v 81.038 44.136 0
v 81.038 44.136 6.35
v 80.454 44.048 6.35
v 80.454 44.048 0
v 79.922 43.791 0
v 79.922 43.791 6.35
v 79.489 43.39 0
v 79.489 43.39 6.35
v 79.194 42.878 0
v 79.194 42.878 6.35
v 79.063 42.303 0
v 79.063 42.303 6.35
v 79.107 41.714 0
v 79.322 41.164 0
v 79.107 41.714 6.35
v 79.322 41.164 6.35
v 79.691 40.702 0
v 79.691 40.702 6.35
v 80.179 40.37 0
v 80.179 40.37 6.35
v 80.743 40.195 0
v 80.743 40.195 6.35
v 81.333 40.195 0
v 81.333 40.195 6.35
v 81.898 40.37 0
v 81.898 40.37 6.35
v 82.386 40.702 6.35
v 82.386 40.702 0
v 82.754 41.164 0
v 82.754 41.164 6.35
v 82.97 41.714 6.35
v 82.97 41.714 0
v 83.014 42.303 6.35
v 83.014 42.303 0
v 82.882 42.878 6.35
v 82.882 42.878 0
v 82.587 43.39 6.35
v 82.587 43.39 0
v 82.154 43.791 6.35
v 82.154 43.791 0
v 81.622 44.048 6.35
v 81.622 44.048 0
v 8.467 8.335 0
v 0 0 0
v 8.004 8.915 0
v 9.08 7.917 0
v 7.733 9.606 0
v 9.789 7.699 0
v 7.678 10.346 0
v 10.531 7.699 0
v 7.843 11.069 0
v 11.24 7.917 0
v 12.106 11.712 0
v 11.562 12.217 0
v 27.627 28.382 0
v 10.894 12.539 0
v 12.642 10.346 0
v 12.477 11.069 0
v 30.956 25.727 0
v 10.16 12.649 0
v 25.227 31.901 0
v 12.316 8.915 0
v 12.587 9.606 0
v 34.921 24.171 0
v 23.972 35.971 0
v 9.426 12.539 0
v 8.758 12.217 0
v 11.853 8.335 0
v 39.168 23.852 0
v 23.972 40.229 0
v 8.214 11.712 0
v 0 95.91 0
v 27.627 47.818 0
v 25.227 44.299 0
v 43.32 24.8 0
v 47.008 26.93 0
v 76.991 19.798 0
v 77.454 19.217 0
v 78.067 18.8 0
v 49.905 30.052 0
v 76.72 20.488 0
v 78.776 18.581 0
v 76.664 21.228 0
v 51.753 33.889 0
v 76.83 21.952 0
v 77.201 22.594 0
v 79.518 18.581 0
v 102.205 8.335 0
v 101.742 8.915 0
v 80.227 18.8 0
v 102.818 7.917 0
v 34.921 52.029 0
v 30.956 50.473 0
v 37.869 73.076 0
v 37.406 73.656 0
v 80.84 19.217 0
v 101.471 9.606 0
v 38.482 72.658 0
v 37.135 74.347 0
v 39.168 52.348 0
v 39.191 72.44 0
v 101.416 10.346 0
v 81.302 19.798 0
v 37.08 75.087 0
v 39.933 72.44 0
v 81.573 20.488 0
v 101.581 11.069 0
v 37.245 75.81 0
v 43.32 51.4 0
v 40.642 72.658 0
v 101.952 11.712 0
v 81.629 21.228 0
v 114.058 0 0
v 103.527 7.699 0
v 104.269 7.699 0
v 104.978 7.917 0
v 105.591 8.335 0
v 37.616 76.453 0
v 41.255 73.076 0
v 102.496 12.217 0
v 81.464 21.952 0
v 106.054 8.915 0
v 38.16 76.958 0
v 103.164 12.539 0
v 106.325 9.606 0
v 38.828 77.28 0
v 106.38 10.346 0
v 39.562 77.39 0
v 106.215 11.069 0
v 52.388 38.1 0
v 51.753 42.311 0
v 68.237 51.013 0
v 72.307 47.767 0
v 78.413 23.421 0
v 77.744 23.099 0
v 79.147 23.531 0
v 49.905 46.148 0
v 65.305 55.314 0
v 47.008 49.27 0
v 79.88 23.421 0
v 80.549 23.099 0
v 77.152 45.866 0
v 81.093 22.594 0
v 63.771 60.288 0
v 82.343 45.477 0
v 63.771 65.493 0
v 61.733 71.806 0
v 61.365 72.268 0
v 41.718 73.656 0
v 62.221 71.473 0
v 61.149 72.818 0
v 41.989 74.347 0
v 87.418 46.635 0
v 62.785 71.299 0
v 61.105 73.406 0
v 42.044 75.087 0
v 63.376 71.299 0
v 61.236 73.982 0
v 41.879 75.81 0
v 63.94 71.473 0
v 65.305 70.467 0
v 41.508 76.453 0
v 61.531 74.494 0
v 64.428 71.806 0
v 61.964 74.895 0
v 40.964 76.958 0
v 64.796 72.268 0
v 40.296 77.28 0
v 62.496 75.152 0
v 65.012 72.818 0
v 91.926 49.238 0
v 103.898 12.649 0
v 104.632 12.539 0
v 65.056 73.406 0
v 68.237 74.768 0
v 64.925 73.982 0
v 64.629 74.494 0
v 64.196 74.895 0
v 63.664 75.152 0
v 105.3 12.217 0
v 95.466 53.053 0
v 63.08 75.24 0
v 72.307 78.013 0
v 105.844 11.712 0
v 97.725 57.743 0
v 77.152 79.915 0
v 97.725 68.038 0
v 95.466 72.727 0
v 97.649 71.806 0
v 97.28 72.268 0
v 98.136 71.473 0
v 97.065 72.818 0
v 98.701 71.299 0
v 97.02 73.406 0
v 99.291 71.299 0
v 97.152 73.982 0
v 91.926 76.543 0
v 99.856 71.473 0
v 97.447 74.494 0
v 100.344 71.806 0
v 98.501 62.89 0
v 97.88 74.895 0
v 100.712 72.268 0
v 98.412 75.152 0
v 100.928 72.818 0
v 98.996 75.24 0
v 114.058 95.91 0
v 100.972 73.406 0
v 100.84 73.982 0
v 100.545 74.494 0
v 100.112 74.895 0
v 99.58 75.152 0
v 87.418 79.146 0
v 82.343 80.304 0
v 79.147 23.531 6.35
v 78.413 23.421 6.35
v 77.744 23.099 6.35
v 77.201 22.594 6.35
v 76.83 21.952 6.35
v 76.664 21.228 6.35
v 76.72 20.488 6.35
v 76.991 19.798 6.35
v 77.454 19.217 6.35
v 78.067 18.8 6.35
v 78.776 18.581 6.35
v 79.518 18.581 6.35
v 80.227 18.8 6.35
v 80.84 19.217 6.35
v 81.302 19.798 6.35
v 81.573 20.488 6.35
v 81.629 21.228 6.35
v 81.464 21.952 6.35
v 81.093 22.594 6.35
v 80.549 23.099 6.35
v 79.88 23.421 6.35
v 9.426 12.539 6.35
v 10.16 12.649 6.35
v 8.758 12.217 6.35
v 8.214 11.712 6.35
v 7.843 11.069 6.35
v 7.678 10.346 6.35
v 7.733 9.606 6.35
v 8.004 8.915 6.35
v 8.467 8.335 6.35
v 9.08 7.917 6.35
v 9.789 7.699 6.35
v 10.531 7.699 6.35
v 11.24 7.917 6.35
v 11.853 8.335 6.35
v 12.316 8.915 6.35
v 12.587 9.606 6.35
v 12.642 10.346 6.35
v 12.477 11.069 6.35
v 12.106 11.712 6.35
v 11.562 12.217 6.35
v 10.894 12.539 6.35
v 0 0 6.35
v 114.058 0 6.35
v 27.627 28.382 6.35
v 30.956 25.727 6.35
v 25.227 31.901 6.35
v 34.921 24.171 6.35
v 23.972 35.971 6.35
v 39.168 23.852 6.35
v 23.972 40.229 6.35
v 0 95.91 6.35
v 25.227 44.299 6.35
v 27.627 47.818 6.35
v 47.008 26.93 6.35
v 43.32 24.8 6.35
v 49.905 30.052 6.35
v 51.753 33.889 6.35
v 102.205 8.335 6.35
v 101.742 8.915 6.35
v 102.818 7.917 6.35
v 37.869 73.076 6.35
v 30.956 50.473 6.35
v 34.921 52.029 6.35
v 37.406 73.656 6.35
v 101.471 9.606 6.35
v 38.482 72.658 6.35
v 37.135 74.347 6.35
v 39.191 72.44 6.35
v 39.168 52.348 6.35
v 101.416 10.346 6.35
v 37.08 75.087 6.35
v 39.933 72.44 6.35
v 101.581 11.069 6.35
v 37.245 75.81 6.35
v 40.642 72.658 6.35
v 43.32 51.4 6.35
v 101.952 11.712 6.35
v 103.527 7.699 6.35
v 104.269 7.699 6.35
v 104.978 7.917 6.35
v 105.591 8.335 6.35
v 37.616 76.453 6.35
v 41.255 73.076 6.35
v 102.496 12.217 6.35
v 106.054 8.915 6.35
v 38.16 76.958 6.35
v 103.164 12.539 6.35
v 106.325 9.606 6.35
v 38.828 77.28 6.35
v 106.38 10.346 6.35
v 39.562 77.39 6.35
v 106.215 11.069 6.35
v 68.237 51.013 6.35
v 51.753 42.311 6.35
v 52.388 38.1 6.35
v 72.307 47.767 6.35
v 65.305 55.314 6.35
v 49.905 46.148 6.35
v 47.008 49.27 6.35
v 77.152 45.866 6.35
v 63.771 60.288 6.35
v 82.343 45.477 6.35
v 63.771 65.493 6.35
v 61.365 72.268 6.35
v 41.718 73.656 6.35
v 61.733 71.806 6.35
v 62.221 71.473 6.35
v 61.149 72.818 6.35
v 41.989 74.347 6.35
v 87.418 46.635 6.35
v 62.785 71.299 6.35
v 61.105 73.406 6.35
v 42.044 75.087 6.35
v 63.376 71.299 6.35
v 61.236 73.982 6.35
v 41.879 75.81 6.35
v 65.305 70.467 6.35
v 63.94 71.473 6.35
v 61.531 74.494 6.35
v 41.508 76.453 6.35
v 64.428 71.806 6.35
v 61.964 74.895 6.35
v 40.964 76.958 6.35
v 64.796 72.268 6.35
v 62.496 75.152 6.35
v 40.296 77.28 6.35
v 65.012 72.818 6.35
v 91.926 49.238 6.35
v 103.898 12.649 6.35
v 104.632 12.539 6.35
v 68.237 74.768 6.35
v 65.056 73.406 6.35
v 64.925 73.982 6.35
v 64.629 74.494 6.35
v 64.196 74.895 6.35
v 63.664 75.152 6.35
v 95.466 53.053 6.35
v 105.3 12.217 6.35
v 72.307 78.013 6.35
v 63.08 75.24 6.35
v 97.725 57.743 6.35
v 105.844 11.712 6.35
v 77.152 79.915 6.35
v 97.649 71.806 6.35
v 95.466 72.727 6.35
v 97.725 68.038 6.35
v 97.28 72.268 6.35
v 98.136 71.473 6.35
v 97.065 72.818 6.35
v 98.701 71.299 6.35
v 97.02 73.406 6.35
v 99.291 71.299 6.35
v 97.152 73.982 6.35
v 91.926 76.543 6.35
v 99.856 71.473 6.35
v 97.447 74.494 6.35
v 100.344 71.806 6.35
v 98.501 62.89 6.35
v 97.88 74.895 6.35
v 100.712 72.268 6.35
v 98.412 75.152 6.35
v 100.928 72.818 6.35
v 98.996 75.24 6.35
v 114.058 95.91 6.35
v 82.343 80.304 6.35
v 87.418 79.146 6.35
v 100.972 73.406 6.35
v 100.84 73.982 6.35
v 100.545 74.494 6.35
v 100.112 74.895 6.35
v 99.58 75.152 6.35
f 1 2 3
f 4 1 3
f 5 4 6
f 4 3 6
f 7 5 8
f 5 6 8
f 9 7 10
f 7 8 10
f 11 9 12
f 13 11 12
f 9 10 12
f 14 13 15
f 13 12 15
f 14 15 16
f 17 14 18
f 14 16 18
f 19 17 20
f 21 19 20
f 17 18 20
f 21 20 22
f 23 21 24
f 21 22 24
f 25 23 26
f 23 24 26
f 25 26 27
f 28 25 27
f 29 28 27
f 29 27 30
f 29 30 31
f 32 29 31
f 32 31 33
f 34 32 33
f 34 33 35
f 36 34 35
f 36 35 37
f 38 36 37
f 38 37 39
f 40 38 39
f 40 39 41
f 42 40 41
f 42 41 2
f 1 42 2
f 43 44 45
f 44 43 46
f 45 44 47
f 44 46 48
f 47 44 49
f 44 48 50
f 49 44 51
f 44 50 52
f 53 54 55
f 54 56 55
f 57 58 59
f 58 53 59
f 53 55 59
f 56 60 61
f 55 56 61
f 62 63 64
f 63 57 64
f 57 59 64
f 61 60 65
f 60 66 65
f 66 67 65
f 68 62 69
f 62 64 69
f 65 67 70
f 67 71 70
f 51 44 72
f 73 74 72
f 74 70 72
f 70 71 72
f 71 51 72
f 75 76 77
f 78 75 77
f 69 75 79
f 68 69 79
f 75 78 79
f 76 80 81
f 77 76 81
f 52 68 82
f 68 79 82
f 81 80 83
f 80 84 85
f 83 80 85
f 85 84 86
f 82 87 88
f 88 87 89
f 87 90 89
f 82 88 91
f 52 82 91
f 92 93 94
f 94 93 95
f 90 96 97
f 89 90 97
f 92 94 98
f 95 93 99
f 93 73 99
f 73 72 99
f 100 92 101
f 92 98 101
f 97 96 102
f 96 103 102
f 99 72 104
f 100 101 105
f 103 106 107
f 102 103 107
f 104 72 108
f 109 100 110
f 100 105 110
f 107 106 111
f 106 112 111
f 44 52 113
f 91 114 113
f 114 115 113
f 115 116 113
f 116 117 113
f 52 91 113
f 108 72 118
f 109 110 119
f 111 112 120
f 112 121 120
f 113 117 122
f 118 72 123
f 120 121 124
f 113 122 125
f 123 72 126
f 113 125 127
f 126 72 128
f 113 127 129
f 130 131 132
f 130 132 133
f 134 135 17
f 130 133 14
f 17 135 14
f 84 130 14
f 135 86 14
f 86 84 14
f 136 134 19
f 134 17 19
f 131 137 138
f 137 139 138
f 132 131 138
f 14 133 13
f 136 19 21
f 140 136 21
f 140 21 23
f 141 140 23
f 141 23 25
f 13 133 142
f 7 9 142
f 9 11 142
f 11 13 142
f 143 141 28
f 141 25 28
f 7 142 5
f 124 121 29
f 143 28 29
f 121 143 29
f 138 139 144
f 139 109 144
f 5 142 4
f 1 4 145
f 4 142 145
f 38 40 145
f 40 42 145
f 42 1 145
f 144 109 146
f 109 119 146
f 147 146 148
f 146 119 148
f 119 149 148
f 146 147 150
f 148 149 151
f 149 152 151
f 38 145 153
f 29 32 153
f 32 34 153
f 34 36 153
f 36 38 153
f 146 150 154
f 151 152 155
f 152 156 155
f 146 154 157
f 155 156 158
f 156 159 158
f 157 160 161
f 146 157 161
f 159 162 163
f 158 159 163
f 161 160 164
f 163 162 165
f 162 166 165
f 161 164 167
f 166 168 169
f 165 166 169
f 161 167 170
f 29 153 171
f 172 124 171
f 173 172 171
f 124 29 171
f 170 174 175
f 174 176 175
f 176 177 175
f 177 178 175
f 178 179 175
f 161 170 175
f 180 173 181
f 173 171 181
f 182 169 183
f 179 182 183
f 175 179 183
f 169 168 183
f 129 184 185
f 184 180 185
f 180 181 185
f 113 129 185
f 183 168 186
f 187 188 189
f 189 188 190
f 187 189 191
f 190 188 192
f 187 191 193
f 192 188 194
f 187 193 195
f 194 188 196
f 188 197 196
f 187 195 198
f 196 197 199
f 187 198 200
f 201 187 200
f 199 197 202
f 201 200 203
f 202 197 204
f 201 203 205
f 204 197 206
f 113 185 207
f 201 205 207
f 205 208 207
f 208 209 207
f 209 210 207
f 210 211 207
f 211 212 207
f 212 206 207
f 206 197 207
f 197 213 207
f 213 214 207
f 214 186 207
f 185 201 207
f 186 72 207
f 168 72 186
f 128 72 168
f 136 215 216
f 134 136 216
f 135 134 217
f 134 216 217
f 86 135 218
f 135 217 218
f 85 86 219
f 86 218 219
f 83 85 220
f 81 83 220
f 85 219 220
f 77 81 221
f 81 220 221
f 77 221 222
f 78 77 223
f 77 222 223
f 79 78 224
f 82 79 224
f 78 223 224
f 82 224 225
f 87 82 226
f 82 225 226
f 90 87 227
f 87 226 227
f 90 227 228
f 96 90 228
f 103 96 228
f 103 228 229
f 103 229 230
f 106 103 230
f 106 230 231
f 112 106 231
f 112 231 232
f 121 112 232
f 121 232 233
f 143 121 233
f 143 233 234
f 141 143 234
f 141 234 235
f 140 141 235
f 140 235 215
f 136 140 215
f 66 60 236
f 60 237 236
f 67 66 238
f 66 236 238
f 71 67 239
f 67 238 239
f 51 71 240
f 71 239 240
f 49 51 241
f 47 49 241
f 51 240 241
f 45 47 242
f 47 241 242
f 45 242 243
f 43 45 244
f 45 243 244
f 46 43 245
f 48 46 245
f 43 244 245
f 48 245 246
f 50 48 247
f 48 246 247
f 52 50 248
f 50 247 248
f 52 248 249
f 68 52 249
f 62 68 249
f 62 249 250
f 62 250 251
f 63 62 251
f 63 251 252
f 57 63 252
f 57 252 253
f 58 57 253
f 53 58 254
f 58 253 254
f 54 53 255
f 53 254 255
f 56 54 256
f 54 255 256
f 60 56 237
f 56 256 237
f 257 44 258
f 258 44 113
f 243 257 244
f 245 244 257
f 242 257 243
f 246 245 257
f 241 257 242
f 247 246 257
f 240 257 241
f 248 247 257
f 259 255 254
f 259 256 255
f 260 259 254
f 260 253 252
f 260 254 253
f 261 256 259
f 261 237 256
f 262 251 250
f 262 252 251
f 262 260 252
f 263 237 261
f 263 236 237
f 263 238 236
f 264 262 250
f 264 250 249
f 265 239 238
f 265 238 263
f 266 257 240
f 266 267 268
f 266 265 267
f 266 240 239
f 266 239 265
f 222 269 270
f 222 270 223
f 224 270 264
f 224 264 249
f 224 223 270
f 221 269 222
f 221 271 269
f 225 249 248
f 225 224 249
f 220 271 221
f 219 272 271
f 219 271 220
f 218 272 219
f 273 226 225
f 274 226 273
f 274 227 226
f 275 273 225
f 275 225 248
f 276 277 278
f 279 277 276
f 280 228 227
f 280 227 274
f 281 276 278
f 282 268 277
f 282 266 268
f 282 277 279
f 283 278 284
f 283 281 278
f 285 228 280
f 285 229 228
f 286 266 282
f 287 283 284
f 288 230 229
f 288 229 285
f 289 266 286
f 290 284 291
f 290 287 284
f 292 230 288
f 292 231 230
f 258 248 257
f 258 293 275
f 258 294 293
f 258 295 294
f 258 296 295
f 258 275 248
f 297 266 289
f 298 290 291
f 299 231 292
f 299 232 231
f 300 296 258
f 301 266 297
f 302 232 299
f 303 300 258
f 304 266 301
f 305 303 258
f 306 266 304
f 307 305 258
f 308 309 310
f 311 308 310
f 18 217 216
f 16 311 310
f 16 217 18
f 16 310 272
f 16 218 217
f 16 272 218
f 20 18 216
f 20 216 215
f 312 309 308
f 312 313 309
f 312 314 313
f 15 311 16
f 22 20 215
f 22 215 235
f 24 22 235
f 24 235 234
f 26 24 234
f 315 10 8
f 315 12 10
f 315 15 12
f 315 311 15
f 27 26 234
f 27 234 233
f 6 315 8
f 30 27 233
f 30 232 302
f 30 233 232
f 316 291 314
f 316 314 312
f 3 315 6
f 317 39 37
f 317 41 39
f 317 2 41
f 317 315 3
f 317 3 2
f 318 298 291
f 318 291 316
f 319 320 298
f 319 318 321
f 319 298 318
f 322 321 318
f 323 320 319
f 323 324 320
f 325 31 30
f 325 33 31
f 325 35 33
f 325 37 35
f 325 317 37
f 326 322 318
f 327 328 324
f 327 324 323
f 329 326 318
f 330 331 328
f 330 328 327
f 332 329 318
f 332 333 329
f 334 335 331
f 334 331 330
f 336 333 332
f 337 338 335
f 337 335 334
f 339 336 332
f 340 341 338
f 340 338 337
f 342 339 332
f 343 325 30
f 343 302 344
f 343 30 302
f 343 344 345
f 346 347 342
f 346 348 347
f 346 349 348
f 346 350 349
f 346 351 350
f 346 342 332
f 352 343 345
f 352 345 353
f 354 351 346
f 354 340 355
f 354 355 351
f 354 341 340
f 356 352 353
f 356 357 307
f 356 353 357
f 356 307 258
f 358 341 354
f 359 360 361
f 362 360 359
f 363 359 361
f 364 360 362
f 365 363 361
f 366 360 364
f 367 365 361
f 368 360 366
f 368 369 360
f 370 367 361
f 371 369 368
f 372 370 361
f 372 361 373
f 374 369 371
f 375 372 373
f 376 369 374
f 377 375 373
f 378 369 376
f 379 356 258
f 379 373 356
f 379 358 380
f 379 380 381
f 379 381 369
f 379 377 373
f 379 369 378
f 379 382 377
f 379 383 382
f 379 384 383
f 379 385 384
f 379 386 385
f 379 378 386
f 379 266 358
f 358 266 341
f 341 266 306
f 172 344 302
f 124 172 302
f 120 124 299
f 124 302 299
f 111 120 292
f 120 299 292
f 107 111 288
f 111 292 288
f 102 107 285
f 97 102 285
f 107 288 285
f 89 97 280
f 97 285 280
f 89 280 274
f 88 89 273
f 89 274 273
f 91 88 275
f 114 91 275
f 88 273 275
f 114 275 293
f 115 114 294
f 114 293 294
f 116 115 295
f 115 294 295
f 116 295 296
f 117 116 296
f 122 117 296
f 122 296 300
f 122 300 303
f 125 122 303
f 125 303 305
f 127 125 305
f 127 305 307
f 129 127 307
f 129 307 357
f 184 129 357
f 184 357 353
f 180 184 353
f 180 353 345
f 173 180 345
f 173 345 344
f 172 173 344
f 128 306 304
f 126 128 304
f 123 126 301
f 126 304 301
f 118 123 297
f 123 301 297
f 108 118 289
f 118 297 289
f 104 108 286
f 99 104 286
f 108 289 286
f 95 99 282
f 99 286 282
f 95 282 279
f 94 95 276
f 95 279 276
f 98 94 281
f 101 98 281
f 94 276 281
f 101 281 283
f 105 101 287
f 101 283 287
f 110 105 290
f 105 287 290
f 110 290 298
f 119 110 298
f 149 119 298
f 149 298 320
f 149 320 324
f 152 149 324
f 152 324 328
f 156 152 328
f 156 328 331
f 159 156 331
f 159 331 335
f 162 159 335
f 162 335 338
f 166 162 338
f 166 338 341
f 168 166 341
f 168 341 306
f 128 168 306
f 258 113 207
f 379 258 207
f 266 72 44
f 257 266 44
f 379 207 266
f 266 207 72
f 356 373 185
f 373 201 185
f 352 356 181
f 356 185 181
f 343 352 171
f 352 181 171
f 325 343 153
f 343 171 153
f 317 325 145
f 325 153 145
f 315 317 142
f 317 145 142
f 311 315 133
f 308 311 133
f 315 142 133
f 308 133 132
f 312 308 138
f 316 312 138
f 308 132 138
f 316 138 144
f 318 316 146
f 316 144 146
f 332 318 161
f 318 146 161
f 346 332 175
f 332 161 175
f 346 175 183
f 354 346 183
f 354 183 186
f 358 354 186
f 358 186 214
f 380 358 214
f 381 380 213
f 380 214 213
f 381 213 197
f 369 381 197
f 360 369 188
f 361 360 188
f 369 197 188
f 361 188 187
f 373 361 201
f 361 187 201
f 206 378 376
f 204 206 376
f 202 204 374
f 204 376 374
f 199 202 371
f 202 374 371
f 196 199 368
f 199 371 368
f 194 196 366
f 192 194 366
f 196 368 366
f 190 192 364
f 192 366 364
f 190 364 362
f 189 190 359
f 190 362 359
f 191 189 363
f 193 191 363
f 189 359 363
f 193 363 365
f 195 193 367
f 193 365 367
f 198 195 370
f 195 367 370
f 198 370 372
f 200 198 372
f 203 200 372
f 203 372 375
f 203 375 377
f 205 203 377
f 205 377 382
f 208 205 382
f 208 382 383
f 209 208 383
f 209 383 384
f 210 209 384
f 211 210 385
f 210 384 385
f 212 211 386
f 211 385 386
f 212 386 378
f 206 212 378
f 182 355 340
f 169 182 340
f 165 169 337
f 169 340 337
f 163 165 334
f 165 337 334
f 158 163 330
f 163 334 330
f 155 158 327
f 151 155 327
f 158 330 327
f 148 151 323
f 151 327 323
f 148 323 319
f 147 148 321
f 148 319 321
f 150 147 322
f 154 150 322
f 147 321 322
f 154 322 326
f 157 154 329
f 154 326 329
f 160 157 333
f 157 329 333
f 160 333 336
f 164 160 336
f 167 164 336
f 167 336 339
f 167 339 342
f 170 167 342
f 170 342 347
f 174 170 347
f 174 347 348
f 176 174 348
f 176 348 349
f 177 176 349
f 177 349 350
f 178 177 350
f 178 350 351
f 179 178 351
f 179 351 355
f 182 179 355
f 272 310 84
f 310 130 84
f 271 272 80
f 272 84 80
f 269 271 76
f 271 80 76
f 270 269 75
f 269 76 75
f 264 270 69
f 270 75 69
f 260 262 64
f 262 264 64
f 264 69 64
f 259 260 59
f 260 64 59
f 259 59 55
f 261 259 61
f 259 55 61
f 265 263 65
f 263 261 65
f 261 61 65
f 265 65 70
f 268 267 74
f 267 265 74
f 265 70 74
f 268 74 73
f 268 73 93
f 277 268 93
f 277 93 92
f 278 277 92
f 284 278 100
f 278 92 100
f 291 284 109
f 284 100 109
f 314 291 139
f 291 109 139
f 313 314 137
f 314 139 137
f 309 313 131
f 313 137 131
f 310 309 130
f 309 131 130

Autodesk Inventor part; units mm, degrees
sketch "Sketch1" plane through (0, 0, 0) normal (0, 0, 1) x (1, 0, 0)
  line L0 (0, 0) -> (114.0582, 0)
  line L1 (114.0582, 0) -> (114.0582, 95.9104)
  line L2 (114.0582, 95.9104) -> (0, 95.9104)
  line L3 (0, 95.9104) -> (0, 0)
  line L4 (59.1, 17.1) -> (59.1, 59.1)
  line L5 (59.1, 59.1) -> (17.1, 59.1)
  line L6 (17.1, 59.1) -> (17.1, 17.1)
  line L7 (17.1, 17.1) -> (59.1, 17.1)
  line L8 (59.1, 17.1) -> (17.1, 59.1) construction
  line L9 (59.1, 59.1) -> (17.1, 17.1) construction
  circle A0 centre (38.1, 38.1) radius 38.1 construction
  circle A1 centre (38.1, 38.1) radius 20.2
  line L10 (45.4323, 38.1) -> (41.7662, 31.75)
  line L11 (41.7662, 31.75) -> (34.4338, 31.75)
  line L12 (34.4338, 31.75) -> (30.7677, 38.1)
  line L13 (30.7677, 38.1) -> (34.4338, 44.45)
  line L14 (34.4338, 44.45) -> (41.7662, 44.45)
  line L15 (41.7662, 44.45) -> (45.4323, 38.1)
  circle A2 centre (38.1, 38.1) radius 21.59 construction
  line L16 (38.1, 38.1) -> (81.0382, 62.8904) construction
  circle A3 centre (81.0382, 62.8904) radius 27.94 construction
  circle A4 centre (81.0382, 62.8904) radius 23.8125 construction
  circle A5 centre (81.0382, 62.8904) radius 17.4625
  circle A6 centre (38.1, 38.1) radius 14.2875
  line L17 (85.0105, 18.6054) -> (38.1, 38.1) construction
  circle A7 centre (81.0382, 62.8904) radius 33.02 construction
  circle A8 centre (38.1, 38.1) radius 25.4 construction
  circle A9 centre (38.1, 38.1) radius 9.525
  line L18 (81.0382, 62.8904) -> (81.0382, 42.1545)
  circle A10 centre (81.0382, 42.1545) radius 2.0828 construction
  circle A11 centre (39.5622, 74.901) radius 10.16
  circle A12 centre (39.5622, 74.901) radius 6.35
  circle A13 centre (81.0382, 42.1545) radius 6.35 construction
  circle A14 centre (38.1, 38.1) radius 26.67 construction
  line L19 (85.0105, 18.6054) -> (87.4474, 24.4692)
  line L20 (85.0105, 18.6054) -> (82.5737, 12.7416)
  line L21 (87.4474, 24.4692) -> (77.6267, 28.5504)
  line L22 (82.5737, 12.7416) -> (72.2567, 17.029)
  circle A15 centre (103.8982, 10.16) radius 10.16
  circle A16 centre (103.8982, 10.16) radius 6.35
  circle A17 centre (10.16, 10.16) radius 10.16
  circle A18 centre (38.1, 38.1) radius 32.258 construction
  circle A19 centre (10.16, 10.16) radius 6.35
  point P0 (20.1395, 56.0605)
  point P1 (56.0605, 20.1395)
  point P2 (81.0382, 44.2373)
  point P3 (81.0382, 45.4279)
  point P4 (98.9961, 73.2584)
  point P5 (63.0804, 73.2584)
  point P6 (81.0382, 48.5045)
  point P7 (79.1467, 21.0422)
  dimension "d10" = 34.925
  dimension "d17" = 4.1656
  dimension "d25" = 12.7
  dimension "d0" = 42
  dimension "d1" = 42
  dimension "d2" = 76.2
  dimension "d3" = 40.4
  dimension "d4" = 12.7
  dimension "d5" = 43.18
  dimension "d6" = 55.88
  dimension "d7" = 49.5808
  dimension "d8" = 47.625
  dimension "d11" = 28.575
  dimension "d13" = 30
  dimension "d14" = 5.08
  dimension "d15" = 50.8
  dimension "d16" = 19.05
  dimension "d18" = 1.1906
  dimension "d21" = 360
  dimension "d23" = 20.32
  dimension "d24" = 12.7
  dimension "d26" = 3.0766
  dimension "d30" = 5.08
  dimension "d33" = 50.8
  dimension "d34" = 6.35
  dimension "d35" = 6.35
  dimension "d36" = 20.32
  dimension "d37" = 64.516
  dimension "d38" = 12.7
ref_plane "Work Plane1" through (0, 0, -6.35) normal (0, 0, 1) x (1, 0, 0)
ref_plane "Work Plane2" through (0, 0, -41.875) normal (0, 0, 1) x (1, 0, 0)
ref_plane "Work Plane3" through (0, 0, -35.525) normal (0, 0, 1) x (1, 0, 0)
ref_plane "Work Plane4" through (0, 0, -92.675) normal (0, 0, 1) x (1, 0, 0)
ref_plane "Work Plane5" through (0, 0, -99.025) normal (0, 0, 1) x (1, 0, 0)
sketch "Sketch2" plane through (0, 0, -6.35) normal (0, 0, 1) x (1, 0, 0)
  line L0 (114.0582, 95.9104) -> (0, 95.9104) projected
  line L1 (0, 95.9104) -> (0, 0) projected
  line L2 (0, 0) -> (114.0582, 0) projected
  line L3 (114.0582, 0) -> (114.0582, 95.9104) projected
  circle A0 centre (81.0382, 62.8904) radius 17.4625 projected
  circle A1 centre (38.1, 38.1) radius 9.525 projected
  dimension "d14" = 5.08
sketch "Sketch3" plane through (0, 0, -41.875) normal (0, 0, 1) x (1, 0, 0)
  line L0 (114.0582, 95.9104) -> (0, 95.9104) projected
  line L1 (114.0582, 0) -> (114.0582, 95.9104) projected
  circle A0 centre (81.0382, 62.8904) radius 17.4625 projected
  line L2 (0, 0) -> (114.0582, 0) projected
  line L3 (0, 95.9104) -> (0, 0) projected
  circle A1 centre (38.1, 38.1) radius 14.2875 projected
  dimension "d14" = 5.08
sketch "Sketch4" plane through (0, 0, -35.525) normal (0, 0, 1) x (1, 0, 0)
  line L0 (114.0582, 95.9104) -> (0, 95.9104) projected
  line L1 (0, 95.9104) -> (0, 0) projected
  line L2 (0, 0) -> (114.0582, 0) projected
  line L3 (114.0582, 0) -> (114.0582, 95.9104) projected
  circle A0 centre (81.0382, 62.8904) radius 17.4625 projected
  circle A1 centre (38.1, 38.1) radius 14.2875 projected
  dimension "d14" = 5.08
sketch "Sketch5" plane through (0, 0, -92.675) normal (0, 0, 1) x (1, 0, 0)
  line L0 (0, 95.9104) -> (0, 0) projected
  line L1 (114.0582, 95.9104) -> (0, 95.9104) projected
  line L2 (0, 0) -> (114.0582, 0) projected
  line L3 (114.0582, 0) -> (114.0582, 95.9104) projected
  circle A0 centre (81.0382, 62.8904) radius 17.4625 projected
  dimension "d14" = 5.08
sketch "Sketch6" plane through (0, 0, -99.025) normal (0, 0, 1) x (1, 0, 0)
  line L0 (0, 95.9104) -> (0, 0) projected
  line L1 (0, 0) -> (114.0582, 0) projected
  line L2 (114.0582, 0) -> (114.0582, 95.9104) projected
  line L3 (114.0582, 95.9104) -> (0, 95.9104) projected
  circle A0 centre (81.0382, 62.8904) radius 17.4625 projected
  dimension "d14" = 5.08
extrude "Extrusion1" add sketch "Sketch1" along normal blind 6.35 contours L3 A17 L0 | A17 L7 L4 L5 L6 L3 L2 L1 A15 L0 | A17 L6 L7 | A15 L1 L0 | A15 | A17 L7 L6 | L6 L5 L4 L7 A17 | A1 | A11 | A12 | A16 | A19
hole "Hole1" at (81.0382, 42.1545, 0) at (98.9961, 73.2584, 0) at (63.0804, 73.2584, 0) direction (0, 0, 1) diameter 3.9624 end through all thread size "10-32 UNF" class "2B" standard "ANSI Unified Screw Threads"
hole "Hole2" at (79.1467, 21.0422, 0) direction (0, 0, 1) diameter 4.9784 end through all thread size "1/4-20 UNC" class "2B" standard "ANSI Unified Screw Threads"
hole "Hole3" at (39.5622, 74.901, 0) at (103.8982, 10.16, 0) at (10.16, 10.16, 0) direction (0, 0, 1) diameter 4.9784 end through all clearance for "Socket Head Cap Screw" size "#10" standard "Ansi Unified Screw Threads"
equation "\"d30\" = d14"
properties part number "Main Outline"
